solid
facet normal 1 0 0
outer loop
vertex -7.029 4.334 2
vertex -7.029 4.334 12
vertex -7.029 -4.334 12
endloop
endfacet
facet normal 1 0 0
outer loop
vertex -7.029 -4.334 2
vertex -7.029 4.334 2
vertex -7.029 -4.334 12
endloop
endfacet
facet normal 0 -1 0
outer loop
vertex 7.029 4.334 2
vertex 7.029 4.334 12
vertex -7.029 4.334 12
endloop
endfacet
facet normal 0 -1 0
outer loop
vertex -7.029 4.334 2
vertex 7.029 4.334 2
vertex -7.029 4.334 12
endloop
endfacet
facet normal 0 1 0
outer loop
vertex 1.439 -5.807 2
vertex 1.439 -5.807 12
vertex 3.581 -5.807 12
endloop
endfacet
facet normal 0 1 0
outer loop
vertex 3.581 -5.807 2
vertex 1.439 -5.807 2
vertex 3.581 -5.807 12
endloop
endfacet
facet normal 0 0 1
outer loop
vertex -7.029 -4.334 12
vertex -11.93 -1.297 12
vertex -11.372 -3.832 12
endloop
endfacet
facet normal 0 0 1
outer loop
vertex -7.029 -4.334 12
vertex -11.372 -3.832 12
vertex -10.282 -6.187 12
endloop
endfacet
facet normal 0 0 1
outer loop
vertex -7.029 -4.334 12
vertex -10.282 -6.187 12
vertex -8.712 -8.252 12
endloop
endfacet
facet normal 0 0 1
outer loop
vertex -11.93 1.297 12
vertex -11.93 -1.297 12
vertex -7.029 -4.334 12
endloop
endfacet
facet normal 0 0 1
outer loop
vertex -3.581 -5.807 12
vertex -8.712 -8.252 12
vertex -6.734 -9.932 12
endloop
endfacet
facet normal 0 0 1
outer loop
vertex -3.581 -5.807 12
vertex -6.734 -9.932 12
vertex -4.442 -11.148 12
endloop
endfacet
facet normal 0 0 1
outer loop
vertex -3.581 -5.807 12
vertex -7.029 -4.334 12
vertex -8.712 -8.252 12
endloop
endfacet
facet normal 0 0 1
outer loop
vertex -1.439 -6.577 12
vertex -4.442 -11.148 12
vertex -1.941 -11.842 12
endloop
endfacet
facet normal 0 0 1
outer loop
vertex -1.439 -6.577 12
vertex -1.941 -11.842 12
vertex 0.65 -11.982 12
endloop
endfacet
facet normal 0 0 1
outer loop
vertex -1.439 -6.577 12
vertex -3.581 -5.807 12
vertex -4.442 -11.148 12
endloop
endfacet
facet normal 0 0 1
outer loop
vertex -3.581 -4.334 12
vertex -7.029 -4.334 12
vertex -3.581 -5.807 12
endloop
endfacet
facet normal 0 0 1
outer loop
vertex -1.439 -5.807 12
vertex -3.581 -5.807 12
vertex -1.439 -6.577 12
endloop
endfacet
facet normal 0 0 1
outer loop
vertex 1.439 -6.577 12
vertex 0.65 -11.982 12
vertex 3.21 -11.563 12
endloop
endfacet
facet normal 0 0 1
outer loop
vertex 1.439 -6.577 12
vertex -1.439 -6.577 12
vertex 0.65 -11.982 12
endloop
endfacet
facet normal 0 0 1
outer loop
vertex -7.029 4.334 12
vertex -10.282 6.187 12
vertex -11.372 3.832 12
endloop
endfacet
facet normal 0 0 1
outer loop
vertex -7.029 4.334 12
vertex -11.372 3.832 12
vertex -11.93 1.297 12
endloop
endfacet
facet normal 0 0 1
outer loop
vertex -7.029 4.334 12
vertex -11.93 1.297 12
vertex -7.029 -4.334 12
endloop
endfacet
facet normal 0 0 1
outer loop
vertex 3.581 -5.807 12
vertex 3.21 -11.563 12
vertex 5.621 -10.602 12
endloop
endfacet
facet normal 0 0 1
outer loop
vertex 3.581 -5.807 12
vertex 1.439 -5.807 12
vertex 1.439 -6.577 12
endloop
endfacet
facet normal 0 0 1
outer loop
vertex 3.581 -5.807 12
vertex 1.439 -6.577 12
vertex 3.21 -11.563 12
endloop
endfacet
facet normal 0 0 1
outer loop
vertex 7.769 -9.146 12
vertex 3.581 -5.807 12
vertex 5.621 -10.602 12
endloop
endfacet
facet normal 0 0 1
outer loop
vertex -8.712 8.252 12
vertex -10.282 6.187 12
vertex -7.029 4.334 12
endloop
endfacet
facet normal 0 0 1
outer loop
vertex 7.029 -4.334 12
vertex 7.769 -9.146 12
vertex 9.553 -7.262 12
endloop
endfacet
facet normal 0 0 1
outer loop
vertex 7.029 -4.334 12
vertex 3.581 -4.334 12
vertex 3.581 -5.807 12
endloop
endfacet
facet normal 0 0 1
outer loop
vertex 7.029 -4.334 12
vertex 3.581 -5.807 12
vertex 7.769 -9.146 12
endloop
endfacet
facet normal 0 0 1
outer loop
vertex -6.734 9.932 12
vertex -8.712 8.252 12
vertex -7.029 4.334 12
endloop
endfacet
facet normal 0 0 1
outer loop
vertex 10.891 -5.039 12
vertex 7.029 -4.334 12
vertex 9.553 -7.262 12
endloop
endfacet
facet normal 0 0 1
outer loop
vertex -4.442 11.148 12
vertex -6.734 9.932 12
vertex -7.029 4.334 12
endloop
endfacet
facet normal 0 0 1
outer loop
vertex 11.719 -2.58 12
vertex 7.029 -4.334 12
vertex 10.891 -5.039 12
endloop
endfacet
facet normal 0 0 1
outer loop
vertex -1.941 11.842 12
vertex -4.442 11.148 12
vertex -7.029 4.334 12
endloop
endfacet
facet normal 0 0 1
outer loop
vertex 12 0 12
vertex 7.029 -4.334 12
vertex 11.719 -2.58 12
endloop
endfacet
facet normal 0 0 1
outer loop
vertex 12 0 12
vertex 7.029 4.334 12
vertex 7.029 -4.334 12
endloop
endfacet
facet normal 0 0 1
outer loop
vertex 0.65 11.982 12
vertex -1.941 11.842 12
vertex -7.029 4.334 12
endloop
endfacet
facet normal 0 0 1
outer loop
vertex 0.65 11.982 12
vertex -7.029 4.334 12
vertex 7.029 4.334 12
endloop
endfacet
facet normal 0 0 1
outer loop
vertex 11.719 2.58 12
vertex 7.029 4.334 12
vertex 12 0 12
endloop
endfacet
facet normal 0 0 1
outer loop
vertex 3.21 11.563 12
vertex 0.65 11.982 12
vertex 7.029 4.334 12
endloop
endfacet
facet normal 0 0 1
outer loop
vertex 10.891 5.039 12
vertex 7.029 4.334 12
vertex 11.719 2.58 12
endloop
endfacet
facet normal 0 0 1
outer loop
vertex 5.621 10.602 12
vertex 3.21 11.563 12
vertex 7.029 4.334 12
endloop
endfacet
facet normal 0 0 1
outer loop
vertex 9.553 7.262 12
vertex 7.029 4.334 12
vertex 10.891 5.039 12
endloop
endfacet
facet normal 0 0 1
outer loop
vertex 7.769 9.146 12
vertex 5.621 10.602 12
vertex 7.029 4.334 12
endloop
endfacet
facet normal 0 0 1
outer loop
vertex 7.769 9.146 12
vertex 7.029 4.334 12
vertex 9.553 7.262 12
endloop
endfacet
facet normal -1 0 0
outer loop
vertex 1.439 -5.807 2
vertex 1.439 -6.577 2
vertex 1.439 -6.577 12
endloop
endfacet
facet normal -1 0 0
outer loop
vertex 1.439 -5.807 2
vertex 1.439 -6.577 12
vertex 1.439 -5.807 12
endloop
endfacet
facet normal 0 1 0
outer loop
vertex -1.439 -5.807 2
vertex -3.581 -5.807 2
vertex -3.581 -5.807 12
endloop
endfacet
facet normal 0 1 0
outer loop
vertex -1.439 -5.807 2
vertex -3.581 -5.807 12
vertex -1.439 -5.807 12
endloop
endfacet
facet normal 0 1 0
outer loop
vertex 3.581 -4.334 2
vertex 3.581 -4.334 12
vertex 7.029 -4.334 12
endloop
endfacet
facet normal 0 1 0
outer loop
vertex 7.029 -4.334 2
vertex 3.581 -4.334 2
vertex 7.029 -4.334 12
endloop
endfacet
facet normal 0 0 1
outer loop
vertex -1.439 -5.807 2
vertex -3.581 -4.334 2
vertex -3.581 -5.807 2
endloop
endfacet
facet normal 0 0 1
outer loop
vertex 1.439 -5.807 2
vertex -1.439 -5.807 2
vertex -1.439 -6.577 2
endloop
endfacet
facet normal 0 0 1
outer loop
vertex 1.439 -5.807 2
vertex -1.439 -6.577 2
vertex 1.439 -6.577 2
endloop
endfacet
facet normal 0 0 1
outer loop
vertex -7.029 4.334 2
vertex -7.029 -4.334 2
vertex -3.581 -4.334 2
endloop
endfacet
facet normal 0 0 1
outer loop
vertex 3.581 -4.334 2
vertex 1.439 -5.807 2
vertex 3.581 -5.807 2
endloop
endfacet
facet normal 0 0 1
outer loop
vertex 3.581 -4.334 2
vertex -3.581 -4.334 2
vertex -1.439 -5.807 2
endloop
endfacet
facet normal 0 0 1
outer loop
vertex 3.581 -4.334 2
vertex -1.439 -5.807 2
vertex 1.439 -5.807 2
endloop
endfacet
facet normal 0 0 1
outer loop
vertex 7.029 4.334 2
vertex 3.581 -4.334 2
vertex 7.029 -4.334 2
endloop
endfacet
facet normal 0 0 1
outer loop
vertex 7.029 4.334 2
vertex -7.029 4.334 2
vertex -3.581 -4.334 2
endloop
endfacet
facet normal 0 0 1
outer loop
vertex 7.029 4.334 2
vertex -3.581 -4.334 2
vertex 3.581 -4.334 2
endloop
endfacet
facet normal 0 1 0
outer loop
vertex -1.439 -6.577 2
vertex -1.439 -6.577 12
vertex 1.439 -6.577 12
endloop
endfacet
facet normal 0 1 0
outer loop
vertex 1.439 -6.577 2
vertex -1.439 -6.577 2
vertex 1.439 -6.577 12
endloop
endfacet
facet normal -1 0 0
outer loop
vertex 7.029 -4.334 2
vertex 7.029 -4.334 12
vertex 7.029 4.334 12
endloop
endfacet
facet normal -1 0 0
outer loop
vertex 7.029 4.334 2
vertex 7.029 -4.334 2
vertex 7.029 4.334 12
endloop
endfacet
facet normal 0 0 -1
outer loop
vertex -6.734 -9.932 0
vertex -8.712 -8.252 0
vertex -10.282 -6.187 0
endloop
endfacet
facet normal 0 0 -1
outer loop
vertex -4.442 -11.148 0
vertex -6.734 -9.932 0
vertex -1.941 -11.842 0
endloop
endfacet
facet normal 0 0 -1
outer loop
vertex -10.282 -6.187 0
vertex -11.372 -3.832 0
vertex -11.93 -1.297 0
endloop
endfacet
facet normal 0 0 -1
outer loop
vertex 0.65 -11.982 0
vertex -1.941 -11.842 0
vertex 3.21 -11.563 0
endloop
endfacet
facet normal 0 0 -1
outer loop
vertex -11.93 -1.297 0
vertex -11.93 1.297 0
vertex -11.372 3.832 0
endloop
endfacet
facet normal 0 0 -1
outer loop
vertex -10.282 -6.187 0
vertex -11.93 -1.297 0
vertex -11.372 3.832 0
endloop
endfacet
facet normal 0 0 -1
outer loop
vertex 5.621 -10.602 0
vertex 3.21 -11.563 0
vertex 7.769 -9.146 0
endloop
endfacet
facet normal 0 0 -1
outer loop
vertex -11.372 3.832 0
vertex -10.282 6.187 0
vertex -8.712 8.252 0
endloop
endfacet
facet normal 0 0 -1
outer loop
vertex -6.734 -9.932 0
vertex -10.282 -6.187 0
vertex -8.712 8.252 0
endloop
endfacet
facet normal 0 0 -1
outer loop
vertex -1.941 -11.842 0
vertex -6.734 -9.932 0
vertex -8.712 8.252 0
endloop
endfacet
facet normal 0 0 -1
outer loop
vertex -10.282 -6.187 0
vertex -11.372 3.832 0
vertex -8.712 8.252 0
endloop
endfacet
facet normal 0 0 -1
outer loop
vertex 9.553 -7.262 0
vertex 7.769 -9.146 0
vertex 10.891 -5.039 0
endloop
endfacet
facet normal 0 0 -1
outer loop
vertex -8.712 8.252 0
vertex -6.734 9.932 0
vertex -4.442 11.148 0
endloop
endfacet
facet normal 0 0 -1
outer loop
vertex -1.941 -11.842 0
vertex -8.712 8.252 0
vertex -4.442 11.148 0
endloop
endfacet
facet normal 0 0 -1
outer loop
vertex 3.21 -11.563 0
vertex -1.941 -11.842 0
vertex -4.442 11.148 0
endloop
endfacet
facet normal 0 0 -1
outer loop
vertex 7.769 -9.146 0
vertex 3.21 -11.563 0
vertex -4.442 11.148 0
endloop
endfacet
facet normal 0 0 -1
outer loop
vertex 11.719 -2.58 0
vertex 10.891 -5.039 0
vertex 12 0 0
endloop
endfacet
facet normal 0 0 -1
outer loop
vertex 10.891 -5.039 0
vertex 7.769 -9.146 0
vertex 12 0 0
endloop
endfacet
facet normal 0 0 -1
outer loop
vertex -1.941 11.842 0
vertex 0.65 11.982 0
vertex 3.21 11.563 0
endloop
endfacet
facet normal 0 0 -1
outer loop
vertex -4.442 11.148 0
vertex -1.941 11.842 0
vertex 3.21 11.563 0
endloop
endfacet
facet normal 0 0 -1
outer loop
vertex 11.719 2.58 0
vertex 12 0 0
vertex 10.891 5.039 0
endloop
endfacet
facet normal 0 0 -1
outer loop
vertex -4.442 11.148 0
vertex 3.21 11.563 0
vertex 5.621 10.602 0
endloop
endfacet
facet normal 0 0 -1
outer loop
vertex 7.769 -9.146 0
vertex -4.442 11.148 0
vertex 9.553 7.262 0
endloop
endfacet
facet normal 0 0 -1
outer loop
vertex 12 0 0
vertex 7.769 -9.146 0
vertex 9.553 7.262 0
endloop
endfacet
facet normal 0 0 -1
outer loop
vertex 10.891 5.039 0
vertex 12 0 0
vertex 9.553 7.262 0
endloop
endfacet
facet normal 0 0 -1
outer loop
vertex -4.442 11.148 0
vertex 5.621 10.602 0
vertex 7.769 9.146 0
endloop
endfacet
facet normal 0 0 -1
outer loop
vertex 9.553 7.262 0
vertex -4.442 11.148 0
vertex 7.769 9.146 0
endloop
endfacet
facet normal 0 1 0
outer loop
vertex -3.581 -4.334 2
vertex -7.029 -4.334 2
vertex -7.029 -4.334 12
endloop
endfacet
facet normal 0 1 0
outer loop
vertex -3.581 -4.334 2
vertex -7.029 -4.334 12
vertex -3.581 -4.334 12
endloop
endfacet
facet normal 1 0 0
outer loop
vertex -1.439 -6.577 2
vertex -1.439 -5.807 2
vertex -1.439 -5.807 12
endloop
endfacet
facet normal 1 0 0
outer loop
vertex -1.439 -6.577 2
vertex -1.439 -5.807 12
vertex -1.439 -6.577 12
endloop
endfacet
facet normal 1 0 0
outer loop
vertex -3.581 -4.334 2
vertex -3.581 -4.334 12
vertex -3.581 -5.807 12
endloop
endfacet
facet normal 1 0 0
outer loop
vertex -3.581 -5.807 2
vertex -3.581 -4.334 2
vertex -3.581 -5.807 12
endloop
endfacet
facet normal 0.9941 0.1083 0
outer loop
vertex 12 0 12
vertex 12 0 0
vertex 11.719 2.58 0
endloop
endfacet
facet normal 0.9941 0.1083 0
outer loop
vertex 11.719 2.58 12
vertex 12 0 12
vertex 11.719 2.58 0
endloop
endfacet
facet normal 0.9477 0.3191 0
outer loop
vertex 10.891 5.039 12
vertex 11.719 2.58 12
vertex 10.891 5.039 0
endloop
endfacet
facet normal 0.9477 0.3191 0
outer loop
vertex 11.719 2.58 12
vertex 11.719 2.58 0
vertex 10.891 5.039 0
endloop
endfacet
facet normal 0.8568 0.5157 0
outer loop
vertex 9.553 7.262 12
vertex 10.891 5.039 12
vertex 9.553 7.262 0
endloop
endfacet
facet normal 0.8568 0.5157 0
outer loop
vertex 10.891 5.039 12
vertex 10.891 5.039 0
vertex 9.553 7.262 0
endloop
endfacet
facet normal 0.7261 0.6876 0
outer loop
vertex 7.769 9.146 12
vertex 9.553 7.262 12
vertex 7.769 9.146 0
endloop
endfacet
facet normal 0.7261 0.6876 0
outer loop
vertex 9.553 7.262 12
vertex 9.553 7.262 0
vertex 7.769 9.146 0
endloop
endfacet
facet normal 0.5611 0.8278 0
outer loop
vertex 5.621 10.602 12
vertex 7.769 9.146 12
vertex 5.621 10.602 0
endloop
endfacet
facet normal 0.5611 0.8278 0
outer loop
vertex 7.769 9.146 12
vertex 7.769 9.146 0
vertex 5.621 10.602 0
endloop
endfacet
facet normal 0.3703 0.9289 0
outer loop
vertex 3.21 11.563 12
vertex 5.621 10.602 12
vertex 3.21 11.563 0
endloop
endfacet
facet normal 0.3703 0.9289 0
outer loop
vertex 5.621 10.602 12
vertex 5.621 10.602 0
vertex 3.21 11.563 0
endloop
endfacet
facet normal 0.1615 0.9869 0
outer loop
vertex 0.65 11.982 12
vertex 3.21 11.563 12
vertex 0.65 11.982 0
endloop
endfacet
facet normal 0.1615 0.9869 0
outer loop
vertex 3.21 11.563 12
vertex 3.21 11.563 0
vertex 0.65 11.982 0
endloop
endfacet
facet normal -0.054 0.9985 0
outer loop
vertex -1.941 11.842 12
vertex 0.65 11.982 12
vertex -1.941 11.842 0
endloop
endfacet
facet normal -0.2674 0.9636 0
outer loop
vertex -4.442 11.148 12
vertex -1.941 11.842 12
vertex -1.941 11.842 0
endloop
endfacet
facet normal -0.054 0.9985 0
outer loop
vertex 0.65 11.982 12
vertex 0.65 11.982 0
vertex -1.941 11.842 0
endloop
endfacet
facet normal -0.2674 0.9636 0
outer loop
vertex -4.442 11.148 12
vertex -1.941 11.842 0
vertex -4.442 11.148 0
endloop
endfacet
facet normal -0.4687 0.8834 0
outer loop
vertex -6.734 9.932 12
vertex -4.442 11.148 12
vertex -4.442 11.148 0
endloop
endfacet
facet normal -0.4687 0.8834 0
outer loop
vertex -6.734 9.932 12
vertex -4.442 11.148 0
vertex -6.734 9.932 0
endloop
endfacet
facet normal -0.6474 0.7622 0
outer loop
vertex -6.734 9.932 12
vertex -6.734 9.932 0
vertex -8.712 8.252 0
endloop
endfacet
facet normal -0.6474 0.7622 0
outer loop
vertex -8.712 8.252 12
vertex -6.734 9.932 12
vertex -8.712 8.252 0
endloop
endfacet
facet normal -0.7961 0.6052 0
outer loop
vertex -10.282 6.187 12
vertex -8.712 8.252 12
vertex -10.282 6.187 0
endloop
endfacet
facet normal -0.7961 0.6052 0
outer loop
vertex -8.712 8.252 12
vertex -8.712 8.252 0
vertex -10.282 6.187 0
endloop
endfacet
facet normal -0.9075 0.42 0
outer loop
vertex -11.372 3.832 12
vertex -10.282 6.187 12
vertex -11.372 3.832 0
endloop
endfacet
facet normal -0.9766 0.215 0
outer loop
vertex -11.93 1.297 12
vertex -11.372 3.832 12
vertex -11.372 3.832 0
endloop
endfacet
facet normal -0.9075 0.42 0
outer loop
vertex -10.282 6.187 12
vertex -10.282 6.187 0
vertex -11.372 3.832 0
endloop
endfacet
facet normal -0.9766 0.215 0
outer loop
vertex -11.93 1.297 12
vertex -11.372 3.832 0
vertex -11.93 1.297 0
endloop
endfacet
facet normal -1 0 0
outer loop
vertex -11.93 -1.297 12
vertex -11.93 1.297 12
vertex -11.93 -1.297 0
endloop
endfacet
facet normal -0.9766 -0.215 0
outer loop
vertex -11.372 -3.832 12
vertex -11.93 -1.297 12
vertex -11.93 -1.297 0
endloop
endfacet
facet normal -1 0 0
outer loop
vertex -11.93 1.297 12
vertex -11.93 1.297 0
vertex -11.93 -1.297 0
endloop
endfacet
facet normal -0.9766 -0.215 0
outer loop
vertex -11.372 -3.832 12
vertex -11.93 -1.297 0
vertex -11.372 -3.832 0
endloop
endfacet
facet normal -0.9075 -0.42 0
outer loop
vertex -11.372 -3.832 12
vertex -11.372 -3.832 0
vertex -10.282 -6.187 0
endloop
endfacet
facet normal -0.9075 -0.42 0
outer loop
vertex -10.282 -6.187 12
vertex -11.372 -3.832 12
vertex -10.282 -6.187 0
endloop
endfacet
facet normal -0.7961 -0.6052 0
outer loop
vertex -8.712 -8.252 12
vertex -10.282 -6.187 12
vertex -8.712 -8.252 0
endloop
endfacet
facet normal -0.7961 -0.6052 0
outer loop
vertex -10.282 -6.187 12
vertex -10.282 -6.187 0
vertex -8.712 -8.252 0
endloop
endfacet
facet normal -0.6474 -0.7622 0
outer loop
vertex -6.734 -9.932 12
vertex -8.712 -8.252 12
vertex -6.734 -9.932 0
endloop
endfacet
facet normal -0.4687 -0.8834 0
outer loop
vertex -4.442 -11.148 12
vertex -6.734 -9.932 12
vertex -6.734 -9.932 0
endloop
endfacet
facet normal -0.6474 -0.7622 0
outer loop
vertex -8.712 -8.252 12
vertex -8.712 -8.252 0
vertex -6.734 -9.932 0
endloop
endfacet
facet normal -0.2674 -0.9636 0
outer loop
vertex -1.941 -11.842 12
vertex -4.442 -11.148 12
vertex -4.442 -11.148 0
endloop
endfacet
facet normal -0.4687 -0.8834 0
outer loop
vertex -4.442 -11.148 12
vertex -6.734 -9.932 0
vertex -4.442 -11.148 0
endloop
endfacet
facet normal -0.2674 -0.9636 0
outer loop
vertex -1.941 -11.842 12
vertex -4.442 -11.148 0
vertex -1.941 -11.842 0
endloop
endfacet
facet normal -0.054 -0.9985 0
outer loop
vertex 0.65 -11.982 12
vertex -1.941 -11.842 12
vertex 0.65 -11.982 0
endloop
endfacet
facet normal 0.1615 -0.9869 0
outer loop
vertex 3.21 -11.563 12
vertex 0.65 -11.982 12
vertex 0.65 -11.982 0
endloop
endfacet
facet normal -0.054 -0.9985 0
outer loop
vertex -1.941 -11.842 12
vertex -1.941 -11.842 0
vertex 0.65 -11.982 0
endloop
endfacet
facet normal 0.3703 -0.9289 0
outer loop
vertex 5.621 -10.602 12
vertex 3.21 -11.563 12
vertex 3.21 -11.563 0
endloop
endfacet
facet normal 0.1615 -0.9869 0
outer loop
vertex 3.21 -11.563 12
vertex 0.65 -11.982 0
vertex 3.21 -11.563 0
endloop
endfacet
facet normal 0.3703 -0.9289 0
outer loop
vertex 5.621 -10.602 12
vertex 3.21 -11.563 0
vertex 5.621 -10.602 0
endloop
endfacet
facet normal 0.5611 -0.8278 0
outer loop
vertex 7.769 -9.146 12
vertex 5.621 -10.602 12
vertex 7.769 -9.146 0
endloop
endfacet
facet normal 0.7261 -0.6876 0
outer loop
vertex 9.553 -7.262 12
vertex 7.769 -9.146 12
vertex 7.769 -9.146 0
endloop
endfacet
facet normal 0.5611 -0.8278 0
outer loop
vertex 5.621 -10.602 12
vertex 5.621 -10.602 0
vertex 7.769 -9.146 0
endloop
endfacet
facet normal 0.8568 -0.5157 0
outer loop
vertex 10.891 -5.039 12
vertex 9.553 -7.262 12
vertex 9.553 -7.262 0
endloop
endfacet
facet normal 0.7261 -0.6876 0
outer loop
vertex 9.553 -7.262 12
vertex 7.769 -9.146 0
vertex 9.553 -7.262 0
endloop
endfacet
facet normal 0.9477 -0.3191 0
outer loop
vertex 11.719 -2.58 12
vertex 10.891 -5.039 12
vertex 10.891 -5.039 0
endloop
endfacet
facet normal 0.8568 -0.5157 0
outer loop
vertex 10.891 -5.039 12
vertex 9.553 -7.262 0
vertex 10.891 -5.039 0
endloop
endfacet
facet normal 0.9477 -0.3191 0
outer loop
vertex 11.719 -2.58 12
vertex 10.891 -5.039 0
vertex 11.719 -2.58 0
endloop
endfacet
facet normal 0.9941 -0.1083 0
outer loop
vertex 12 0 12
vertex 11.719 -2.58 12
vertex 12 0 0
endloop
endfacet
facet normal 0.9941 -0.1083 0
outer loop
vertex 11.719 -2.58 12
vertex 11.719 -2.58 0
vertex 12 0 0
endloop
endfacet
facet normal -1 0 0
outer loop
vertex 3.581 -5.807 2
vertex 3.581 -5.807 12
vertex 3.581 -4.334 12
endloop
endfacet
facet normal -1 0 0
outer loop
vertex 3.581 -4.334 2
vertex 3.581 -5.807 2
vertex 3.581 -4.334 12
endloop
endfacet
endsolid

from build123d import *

# Parameters (mm, degrees)
SKETCH2_R           = 12
BOSS_EXTRUDE1_DEPTH = 12
CUT_EXTRUDE1_DEPTH  = 10


with BuildPart() as part:
    # Sketch2 → Boss-Extrude1 (new body)
    with BuildSketch(Plane.XY):
        Circle(SKETCH2_R)
    extrude(amount=BOSS_EXTRUDE1_DEPTH)

    # Sketch3 → Cut-Extrude1 (cut)
    with BuildSketch(Plane.XY.offset(12)):
        Polygon((3.581048399, -4.334317157), (7.028622417, -4.334317157), (7.028622417, 4.334317157), (-7.028622417, 4.334317157), (-7.028622417, -4.334317157), (-3.581048399, -4.334317157), (-3.581048399, -5.807105512), (-1.439194114, -5.807105512), (-1.439194114, -6.576782405), (1.439194114, -6.576782405), (1.439194114, -5.807105512), (3.581048399, -5.807105512), align=None)
    extrude(amount=-CUT_EXTRUDE1_DEPTH, mode=Mode.SUBTRACT)


solid = part.part
